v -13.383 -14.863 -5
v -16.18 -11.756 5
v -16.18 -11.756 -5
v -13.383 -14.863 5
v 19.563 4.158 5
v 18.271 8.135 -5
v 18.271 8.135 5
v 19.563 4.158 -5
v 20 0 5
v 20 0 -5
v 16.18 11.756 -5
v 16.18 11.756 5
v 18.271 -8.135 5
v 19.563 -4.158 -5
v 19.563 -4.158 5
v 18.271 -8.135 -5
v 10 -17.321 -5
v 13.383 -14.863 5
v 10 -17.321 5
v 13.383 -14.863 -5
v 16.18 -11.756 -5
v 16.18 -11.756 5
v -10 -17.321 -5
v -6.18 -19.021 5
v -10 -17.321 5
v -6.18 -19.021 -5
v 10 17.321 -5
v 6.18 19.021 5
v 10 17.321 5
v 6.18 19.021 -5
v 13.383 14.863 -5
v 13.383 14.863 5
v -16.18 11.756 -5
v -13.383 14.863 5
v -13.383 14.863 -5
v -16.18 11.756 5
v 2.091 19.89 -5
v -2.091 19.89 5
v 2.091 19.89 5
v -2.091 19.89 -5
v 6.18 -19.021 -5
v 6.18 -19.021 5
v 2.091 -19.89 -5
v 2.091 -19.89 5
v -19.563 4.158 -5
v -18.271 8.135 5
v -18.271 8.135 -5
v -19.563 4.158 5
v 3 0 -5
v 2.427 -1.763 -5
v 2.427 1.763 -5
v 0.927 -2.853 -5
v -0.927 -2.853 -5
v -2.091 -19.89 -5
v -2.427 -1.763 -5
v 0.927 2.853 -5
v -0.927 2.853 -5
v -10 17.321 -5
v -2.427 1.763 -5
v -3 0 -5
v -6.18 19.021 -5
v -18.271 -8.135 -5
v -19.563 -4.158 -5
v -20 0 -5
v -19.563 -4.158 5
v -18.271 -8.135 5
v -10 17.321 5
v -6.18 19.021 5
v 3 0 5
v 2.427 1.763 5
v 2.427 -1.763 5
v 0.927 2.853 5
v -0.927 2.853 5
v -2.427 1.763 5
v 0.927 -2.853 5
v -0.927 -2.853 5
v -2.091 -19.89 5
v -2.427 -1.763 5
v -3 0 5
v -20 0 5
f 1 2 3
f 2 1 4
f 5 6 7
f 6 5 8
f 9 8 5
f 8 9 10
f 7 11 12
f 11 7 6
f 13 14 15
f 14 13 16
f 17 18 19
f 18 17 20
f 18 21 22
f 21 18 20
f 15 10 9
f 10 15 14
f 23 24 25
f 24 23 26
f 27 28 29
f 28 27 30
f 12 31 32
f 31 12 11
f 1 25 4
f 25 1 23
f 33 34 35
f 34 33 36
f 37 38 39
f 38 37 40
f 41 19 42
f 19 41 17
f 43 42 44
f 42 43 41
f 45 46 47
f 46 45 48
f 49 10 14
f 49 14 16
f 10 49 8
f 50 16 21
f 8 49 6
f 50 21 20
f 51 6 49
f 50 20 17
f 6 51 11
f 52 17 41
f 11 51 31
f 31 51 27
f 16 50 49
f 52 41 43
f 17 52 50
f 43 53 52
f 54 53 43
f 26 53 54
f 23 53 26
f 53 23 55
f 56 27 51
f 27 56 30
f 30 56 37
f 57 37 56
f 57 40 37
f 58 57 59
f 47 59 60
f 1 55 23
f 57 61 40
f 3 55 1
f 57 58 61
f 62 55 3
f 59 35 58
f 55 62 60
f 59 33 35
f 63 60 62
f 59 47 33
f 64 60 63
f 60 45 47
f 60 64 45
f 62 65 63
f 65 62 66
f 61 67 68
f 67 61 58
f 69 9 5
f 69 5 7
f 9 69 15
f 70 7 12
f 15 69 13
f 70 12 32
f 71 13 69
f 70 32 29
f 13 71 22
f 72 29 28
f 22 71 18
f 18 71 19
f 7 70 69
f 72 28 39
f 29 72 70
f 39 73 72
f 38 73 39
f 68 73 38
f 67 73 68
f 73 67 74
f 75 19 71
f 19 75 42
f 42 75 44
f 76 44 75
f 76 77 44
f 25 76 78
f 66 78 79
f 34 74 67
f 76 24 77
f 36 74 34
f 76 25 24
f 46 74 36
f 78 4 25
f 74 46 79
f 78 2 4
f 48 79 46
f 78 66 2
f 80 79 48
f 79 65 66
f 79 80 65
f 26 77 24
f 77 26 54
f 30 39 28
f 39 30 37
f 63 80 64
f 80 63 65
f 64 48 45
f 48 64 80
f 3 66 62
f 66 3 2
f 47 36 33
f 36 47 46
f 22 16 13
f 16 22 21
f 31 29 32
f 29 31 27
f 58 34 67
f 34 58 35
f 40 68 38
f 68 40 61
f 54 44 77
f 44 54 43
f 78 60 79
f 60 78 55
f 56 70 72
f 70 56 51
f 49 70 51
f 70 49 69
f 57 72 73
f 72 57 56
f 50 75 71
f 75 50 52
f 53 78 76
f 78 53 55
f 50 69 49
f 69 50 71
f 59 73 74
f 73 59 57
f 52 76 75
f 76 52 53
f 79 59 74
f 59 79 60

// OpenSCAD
difference() {
  cylinder(r=20, h=10, center=true);
  cylinder(r=3, h=10, center=true);
}
